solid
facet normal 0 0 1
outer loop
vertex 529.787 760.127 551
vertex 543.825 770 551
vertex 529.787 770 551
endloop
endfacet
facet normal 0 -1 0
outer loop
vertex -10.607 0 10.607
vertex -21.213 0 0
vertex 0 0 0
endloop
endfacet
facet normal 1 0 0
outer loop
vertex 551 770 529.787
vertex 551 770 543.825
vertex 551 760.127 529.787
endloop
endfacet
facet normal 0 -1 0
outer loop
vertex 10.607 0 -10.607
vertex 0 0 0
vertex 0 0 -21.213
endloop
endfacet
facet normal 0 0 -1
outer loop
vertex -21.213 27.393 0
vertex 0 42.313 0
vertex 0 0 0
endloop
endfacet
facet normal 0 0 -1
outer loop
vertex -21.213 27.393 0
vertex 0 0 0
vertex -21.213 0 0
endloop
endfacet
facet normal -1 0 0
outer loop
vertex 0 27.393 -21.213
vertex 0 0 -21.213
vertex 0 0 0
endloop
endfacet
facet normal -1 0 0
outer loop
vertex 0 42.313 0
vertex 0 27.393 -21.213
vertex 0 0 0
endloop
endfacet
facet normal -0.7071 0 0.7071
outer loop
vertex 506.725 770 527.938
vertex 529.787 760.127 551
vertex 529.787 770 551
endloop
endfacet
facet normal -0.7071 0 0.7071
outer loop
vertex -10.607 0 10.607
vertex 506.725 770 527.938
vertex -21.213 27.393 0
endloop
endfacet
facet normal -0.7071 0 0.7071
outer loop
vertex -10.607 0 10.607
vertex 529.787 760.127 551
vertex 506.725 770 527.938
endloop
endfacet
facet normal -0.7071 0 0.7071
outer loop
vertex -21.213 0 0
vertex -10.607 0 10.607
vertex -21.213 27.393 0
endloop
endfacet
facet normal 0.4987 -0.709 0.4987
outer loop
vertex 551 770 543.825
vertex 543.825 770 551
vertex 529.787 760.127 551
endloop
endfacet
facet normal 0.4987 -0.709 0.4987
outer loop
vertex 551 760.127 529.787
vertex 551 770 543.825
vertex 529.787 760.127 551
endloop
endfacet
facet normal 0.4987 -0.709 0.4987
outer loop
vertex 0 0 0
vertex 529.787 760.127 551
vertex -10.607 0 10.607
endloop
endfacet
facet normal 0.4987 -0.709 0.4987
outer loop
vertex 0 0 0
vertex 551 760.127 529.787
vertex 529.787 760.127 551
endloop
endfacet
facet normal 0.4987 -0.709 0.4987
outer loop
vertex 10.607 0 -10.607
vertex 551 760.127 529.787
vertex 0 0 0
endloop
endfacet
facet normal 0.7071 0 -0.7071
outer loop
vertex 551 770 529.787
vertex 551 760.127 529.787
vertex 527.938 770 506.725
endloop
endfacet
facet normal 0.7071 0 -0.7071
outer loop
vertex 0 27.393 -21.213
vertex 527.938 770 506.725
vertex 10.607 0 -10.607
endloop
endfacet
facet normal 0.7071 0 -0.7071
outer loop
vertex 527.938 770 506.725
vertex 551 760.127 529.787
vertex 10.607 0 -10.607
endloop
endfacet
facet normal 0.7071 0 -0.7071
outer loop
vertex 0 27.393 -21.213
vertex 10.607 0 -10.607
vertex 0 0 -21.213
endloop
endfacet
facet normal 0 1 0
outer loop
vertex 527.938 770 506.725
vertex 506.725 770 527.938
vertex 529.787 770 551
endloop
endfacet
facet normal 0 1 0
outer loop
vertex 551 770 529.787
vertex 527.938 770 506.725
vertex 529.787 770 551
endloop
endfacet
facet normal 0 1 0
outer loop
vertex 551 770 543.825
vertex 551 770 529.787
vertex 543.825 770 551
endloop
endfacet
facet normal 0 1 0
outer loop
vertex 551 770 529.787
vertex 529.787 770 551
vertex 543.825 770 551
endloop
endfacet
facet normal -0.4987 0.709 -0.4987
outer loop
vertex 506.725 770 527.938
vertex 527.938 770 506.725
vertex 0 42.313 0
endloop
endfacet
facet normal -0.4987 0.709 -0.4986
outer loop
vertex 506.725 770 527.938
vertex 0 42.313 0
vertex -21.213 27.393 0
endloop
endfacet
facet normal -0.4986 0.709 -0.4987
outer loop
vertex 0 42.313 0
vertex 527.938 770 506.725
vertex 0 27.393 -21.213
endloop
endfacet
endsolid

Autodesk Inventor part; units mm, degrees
ref_plane "YZ Plane" through (0, 0, 0) normal (1, 0, 0) x (0, 1, 0)
ref_plane "XZ Plane" through (0, 0, 0) normal (0, 1, 0) x (-1, 0, 0)
ref_plane "XY Plane" through (0, 0, 0) normal (0, 0, 1) x (1, 0, 0)
ref_plane "Plano de trabajo1" through (-15, 0, -15) normal (0, -1, 0) x (1, 0, 0)
sketch "Boceto2" plane through (-15, 0, -15) normal (0, -1, 0) x (1, 0, 0)
  line L0 (566, 15) -> (1911, 15) projected
  line L1 (566, 536) -> (566, 15) projected
  line L2 (1911, 536) -> (566, 536) projected
  line L3 (1911, 15) -> (1911, 536) projected
  line L4 (536, 1414) -> (15, 1414) projected
  line L5 (536, 15) -> (536, 1414) projected
  line L6 (15, 15) -> (536, 15) projected
  line L7 (15, 1414) -> (15, 15) projected
  line L8 (-15, 1444) -> (566, 1444) projected
  line L9 (-15, -15) -> (-15, 1444) projected
  line L10 (1941, -15) -> (-15, -15) projected
  line L11 (1941, 566) -> (1941, -15) projected
  line L12 (566, 566) -> (1941, 566) projected
  line L13 (566, 1444) -> (566, 566) projected
  line L14 (566, 566) -> (566, 544.7868)
  line L15 (6.2132, -15) -> (15, -15)
  line L16 (544.7868, 566) -> (-15, 6.2132)
  line L17 (566, 544.7868) -> (6.2132, -15)
  line L18 (566, 566) -> (544.7868, 566)
  line L19 (-15, 6.2132) -> (-15, -15)
  line L20 (6.2132, -15) -> (-15, -15)
  point P0 (6.2132, -15)
  dimension "d4" = 30
  dimension "d6" = 30
extrude "Extrusión2" add sketch "Boceto2" against normal blind 770 contours L16 L18 L14 L17 L5 | L5 L17 L6 L7 L16 | L7 L6 L17 L10 L9 L16
sketch "Boceto3" plane through (-15, 0, -15) normal (0, -1, 0) x (1, 0, 0)
  line L0 (566, 544.7868) -> (566, 566) projected
  line L1 (566, 566) -> (544.7868, 566) projected
  line L2 (544.7868, 566) -> (-15, 6.2132) projected
  line L3 (-15, 6.2132) -> (-15, -15) projected
  line L4 (-15, -15) -> (6.2132, -15) projected
  line L5 (6.2132, -15) -> (566, 544.7868) projected
  line L6 (-15, -15) -> (15, -15)
  line L7 (15, -15) -> (15, 15)
  line L8 (15, 15) -> (-15, 15)
  line L9 (-15, 15) -> (-15, -15)
  point P0 (-6.2132, 15)
  point P1 (15, -6.2132)
  dimension "d9" = 30
  dimension "d10" = 30
extrude "Extrusión3" cut sketch "Boceto3" against normal blind 770 contours L5 L4 L3 L2 L8 L7
sketch "Boceto4" plane through (551, 0, 529.7868) normal (0.7071, 0, -0.7071) x (-0.7071, 0, -0.7071)
  line L0 (764.2317, 0) -> (764.2317, 770) projected
  line L1 (764.2317, 0) -> (764.2317, 770)
  line L2 (779.2317, 0) -> (764.2317, 0) projected
  line L3 (-9.9264, 770) -> (764.2317, 0)
  line L4 (13.656, 788.8569) -> (806.7728, 0)
  line L5 (779.2317, 0) -> (779.2317, 770) projected
  line L6 (0, 770) -> (779.2317, 770) projected
  line L7 (0, 0) -> (0, 770) projected
  line L8 (779.2317, 0) -> (0, 0) projected
  line L9 (0, 0) -> (-15, 0) projected
  line L10 (0, 0) -> (0, 770) projected
  line L11 (-15, 770) -> (0, 770) projected
  line L12 (-15, 0) -> (-15, 770) projected
  line L13 (779.2317, 0) -> (779.2317, 770) projected
  line L14 (0, 770) -> (779.2317, 770) projected
  line L15 (0, 0) -> (0, 770) projected
  line L16 (779.2317, 0) -> (0, 0) projected
  point P0 (32.6148, 770)
  point P1 (779.2317, 27.3932)
  point P2 (764.2317, 0)
  dimension "d13" = 30
extrude "Extrusión4" cut sketch "Boceto4" against normal blind 770 contours L8 L7 L3 | L4 L6 L0 | L0 L6 L5 L4 | L7 L9 L12 L11 L3
properties part number "Barra inversa"
